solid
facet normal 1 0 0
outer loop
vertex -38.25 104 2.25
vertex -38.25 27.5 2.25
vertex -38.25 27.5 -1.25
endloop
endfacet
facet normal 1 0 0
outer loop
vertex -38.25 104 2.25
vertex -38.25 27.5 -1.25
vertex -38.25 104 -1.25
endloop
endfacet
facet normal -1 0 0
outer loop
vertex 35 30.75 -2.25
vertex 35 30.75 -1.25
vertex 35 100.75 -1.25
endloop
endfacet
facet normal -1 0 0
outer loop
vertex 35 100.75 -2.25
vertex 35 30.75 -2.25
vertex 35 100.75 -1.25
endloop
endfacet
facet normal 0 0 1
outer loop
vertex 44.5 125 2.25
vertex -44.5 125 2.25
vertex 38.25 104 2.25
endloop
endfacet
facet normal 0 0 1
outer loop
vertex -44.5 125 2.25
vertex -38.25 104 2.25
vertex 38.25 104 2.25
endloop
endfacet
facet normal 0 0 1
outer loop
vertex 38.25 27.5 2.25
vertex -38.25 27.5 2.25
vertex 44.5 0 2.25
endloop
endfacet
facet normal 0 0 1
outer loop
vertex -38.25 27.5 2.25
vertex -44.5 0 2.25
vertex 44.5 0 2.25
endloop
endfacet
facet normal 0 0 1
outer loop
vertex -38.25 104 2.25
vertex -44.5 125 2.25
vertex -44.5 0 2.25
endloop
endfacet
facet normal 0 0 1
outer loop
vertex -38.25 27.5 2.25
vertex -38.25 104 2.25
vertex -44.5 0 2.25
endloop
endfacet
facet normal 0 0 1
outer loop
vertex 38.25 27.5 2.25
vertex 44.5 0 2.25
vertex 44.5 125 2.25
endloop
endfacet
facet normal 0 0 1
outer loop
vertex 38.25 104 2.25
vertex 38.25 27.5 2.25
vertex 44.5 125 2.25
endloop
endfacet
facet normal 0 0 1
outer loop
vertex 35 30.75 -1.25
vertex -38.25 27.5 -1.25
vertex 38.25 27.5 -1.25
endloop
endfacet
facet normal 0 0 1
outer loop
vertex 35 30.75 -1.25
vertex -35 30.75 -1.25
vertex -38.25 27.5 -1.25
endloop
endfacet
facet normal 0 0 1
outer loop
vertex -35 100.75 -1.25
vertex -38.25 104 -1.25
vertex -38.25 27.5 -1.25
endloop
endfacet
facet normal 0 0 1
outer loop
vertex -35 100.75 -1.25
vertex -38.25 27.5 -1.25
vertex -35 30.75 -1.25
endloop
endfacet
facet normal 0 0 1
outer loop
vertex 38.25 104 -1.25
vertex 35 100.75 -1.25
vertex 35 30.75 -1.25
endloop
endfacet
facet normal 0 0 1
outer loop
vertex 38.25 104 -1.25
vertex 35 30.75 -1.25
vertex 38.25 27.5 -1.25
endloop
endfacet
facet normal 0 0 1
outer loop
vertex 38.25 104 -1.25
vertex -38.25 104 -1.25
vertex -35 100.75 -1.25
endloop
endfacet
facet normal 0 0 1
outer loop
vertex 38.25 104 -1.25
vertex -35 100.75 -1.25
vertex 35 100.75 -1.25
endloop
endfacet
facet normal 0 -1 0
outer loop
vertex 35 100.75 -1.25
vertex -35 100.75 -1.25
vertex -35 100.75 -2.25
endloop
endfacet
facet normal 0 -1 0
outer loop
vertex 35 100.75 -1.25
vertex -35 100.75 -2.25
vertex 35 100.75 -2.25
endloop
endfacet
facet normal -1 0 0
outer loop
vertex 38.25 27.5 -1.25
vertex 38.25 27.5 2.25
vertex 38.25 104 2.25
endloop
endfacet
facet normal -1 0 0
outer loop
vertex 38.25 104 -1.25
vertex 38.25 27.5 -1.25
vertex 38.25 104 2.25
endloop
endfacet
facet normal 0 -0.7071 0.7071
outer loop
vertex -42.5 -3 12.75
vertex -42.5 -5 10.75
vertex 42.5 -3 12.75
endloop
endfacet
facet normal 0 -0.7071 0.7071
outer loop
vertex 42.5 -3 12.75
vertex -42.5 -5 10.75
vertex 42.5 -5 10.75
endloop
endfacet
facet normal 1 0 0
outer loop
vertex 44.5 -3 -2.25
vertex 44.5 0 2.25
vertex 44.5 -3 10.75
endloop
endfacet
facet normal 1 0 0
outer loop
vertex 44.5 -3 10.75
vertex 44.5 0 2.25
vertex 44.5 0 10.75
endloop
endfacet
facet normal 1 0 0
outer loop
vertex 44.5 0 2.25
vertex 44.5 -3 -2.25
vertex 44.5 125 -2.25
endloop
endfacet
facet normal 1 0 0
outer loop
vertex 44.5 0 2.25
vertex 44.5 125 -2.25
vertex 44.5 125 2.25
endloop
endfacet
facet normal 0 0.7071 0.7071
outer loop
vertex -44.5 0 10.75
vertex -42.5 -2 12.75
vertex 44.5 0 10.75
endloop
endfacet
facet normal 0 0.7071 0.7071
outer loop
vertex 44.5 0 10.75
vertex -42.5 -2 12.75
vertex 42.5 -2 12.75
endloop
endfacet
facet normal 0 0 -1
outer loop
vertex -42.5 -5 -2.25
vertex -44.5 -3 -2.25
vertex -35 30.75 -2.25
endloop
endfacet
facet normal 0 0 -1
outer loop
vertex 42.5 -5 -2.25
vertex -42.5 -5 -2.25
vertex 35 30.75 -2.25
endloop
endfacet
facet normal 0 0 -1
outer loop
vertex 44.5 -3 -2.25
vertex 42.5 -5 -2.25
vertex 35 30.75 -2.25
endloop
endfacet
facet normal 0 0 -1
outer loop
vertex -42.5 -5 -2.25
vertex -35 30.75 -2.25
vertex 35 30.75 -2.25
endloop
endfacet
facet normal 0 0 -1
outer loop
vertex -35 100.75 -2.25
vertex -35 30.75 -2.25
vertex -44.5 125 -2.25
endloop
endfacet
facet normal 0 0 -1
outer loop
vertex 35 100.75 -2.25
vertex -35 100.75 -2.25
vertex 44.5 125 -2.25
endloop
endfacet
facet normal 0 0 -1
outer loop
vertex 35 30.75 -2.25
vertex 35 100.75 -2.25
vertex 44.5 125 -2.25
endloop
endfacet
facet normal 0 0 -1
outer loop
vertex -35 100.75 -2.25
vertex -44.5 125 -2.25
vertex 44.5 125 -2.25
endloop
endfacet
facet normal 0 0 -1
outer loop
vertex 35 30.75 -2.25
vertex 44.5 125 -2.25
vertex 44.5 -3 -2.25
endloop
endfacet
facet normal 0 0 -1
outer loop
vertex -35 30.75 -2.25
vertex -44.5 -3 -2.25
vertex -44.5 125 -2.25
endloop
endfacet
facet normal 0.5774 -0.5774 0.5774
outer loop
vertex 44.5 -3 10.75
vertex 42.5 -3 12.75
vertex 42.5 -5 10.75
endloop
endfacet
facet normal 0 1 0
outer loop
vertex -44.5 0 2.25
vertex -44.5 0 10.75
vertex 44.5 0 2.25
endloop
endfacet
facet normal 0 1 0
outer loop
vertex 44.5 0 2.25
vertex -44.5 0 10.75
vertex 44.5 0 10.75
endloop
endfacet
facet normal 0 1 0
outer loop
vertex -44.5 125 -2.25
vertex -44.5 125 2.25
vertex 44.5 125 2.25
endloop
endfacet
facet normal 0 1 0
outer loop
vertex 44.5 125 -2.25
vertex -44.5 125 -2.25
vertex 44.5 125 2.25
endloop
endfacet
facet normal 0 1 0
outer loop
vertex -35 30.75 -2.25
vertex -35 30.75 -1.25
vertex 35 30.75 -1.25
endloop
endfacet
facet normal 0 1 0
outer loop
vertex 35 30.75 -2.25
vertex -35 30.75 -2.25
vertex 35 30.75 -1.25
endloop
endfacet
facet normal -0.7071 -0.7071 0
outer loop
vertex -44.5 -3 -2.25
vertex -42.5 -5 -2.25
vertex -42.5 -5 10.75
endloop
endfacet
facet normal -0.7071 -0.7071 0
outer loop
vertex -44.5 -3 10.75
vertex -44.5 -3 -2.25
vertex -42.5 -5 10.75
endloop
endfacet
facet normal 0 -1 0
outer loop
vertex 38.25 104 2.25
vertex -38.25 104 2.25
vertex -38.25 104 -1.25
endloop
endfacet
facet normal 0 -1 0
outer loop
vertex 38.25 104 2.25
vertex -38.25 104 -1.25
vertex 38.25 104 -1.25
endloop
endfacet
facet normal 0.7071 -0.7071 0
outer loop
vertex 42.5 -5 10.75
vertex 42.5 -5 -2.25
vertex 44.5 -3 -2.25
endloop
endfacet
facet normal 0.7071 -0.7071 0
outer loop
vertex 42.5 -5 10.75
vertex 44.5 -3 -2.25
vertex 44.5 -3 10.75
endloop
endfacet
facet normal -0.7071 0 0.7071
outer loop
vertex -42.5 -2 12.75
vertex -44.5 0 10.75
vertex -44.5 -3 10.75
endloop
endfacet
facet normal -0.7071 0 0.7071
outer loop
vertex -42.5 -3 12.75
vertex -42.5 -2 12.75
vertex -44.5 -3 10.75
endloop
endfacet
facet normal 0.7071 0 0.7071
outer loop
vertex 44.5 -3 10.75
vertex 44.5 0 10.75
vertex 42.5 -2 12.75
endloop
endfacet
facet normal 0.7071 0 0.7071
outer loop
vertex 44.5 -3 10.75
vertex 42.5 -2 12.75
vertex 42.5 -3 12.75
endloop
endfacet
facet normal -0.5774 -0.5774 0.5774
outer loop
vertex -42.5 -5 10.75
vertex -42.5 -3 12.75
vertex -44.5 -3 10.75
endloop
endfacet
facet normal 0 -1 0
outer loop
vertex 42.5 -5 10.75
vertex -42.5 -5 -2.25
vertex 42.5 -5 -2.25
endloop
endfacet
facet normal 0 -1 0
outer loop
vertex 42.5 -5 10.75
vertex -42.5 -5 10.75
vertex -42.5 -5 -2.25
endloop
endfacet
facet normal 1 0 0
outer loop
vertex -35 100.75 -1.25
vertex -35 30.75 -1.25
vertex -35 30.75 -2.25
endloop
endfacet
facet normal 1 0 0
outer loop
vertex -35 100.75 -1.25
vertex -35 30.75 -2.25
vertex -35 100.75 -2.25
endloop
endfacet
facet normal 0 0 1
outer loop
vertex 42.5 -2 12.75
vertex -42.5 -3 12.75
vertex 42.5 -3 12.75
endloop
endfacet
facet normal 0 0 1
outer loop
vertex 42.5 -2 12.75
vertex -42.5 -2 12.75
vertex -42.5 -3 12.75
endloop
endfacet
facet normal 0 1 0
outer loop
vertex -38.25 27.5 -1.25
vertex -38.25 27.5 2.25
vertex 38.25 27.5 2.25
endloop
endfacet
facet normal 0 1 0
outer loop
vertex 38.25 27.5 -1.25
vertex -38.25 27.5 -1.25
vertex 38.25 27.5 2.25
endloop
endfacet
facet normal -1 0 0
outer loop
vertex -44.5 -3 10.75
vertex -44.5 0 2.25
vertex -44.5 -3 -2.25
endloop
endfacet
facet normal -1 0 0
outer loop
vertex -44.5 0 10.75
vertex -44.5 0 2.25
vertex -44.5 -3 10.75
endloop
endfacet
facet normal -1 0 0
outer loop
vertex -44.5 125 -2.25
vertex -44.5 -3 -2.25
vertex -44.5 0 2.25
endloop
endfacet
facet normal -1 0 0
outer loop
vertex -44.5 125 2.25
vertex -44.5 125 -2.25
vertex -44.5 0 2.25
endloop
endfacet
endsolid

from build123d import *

# Parameters (mm, degrees)
SKETCH_W             = 89
SKETCH_H             = 4.5
PAD_DEPTH            = 125
SKETCH001_W          = 76.5
SKETCH001_H          = 76.5
POCKET_DEPTH         = 3.5
SKETCH002_W          = 70
SKETCH002_H          = 70
POCKET001_DEPTH      = 1.001
POCKET001_DEPTH_BACK = 3.501
SKETCH003_W          = 89
SKETCH003_H          = 15
PAD001_DEPTH         = 5
CHAMFER_SIZE         = 2


with BuildPart() as part:
    # Sketch → Pad (new body)
    with BuildSketch(Plane.XZ):
        Rectangle(SKETCH_W, SKETCH_H)
    extrude(amount=-PAD_DEPTH)

    # Sketch001 (on Face2 of Pad) → Pocket (cut)
    with BuildSketch(Plane.XY.offset(2.25)):
        with Locations((0, 65.75)):
            Rectangle(SKETCH001_W, SKETCH001_H)
    extrude(amount=-POCKET_DEPTH, mode=Mode.SUBTRACT)

    # Sketch002 (on Face11 of Pocket) → Pocket001 (cut, two sides)
    with BuildSketch(Plane.XY.offset(-1.25)) as pocket001_sk:
        with Locations((0, 65.75)):
            Rectangle(SKETCH002_W, SKETCH002_H)
    extrude(amount=-POCKET001_DEPTH, mode=Mode.SUBTRACT)
    extrude(pocket001_sk.sketch, amount=POCKET001_DEPTH_BACK, mode=Mode.SUBTRACT)

    # Sketch003 (on Face4 of Pocket001) → Pad001 (join)
    with BuildSketch(Plane.XZ):
        with Locations((0, 5.25)):
            Rectangle(SKETCH003_W, SKETCH003_H)
    extrude(amount=PAD001_DEPTH)

    # Chamfer
    chamfer_edges = [part.edges().sort_by_distance(p)[0] for p in [
        (0, -5, 12.75),
        (44.5, -2.5, 12.75),
        (0, 0, 12.75),
        (-44.5, -2.5, 12.75),
        (-44.5, -5, 5.25),
        (44.5, -5, 5.25),
    ]]
    chamfer(chamfer_edges, length=CHAMFER_SIZE)


solid = part.part
